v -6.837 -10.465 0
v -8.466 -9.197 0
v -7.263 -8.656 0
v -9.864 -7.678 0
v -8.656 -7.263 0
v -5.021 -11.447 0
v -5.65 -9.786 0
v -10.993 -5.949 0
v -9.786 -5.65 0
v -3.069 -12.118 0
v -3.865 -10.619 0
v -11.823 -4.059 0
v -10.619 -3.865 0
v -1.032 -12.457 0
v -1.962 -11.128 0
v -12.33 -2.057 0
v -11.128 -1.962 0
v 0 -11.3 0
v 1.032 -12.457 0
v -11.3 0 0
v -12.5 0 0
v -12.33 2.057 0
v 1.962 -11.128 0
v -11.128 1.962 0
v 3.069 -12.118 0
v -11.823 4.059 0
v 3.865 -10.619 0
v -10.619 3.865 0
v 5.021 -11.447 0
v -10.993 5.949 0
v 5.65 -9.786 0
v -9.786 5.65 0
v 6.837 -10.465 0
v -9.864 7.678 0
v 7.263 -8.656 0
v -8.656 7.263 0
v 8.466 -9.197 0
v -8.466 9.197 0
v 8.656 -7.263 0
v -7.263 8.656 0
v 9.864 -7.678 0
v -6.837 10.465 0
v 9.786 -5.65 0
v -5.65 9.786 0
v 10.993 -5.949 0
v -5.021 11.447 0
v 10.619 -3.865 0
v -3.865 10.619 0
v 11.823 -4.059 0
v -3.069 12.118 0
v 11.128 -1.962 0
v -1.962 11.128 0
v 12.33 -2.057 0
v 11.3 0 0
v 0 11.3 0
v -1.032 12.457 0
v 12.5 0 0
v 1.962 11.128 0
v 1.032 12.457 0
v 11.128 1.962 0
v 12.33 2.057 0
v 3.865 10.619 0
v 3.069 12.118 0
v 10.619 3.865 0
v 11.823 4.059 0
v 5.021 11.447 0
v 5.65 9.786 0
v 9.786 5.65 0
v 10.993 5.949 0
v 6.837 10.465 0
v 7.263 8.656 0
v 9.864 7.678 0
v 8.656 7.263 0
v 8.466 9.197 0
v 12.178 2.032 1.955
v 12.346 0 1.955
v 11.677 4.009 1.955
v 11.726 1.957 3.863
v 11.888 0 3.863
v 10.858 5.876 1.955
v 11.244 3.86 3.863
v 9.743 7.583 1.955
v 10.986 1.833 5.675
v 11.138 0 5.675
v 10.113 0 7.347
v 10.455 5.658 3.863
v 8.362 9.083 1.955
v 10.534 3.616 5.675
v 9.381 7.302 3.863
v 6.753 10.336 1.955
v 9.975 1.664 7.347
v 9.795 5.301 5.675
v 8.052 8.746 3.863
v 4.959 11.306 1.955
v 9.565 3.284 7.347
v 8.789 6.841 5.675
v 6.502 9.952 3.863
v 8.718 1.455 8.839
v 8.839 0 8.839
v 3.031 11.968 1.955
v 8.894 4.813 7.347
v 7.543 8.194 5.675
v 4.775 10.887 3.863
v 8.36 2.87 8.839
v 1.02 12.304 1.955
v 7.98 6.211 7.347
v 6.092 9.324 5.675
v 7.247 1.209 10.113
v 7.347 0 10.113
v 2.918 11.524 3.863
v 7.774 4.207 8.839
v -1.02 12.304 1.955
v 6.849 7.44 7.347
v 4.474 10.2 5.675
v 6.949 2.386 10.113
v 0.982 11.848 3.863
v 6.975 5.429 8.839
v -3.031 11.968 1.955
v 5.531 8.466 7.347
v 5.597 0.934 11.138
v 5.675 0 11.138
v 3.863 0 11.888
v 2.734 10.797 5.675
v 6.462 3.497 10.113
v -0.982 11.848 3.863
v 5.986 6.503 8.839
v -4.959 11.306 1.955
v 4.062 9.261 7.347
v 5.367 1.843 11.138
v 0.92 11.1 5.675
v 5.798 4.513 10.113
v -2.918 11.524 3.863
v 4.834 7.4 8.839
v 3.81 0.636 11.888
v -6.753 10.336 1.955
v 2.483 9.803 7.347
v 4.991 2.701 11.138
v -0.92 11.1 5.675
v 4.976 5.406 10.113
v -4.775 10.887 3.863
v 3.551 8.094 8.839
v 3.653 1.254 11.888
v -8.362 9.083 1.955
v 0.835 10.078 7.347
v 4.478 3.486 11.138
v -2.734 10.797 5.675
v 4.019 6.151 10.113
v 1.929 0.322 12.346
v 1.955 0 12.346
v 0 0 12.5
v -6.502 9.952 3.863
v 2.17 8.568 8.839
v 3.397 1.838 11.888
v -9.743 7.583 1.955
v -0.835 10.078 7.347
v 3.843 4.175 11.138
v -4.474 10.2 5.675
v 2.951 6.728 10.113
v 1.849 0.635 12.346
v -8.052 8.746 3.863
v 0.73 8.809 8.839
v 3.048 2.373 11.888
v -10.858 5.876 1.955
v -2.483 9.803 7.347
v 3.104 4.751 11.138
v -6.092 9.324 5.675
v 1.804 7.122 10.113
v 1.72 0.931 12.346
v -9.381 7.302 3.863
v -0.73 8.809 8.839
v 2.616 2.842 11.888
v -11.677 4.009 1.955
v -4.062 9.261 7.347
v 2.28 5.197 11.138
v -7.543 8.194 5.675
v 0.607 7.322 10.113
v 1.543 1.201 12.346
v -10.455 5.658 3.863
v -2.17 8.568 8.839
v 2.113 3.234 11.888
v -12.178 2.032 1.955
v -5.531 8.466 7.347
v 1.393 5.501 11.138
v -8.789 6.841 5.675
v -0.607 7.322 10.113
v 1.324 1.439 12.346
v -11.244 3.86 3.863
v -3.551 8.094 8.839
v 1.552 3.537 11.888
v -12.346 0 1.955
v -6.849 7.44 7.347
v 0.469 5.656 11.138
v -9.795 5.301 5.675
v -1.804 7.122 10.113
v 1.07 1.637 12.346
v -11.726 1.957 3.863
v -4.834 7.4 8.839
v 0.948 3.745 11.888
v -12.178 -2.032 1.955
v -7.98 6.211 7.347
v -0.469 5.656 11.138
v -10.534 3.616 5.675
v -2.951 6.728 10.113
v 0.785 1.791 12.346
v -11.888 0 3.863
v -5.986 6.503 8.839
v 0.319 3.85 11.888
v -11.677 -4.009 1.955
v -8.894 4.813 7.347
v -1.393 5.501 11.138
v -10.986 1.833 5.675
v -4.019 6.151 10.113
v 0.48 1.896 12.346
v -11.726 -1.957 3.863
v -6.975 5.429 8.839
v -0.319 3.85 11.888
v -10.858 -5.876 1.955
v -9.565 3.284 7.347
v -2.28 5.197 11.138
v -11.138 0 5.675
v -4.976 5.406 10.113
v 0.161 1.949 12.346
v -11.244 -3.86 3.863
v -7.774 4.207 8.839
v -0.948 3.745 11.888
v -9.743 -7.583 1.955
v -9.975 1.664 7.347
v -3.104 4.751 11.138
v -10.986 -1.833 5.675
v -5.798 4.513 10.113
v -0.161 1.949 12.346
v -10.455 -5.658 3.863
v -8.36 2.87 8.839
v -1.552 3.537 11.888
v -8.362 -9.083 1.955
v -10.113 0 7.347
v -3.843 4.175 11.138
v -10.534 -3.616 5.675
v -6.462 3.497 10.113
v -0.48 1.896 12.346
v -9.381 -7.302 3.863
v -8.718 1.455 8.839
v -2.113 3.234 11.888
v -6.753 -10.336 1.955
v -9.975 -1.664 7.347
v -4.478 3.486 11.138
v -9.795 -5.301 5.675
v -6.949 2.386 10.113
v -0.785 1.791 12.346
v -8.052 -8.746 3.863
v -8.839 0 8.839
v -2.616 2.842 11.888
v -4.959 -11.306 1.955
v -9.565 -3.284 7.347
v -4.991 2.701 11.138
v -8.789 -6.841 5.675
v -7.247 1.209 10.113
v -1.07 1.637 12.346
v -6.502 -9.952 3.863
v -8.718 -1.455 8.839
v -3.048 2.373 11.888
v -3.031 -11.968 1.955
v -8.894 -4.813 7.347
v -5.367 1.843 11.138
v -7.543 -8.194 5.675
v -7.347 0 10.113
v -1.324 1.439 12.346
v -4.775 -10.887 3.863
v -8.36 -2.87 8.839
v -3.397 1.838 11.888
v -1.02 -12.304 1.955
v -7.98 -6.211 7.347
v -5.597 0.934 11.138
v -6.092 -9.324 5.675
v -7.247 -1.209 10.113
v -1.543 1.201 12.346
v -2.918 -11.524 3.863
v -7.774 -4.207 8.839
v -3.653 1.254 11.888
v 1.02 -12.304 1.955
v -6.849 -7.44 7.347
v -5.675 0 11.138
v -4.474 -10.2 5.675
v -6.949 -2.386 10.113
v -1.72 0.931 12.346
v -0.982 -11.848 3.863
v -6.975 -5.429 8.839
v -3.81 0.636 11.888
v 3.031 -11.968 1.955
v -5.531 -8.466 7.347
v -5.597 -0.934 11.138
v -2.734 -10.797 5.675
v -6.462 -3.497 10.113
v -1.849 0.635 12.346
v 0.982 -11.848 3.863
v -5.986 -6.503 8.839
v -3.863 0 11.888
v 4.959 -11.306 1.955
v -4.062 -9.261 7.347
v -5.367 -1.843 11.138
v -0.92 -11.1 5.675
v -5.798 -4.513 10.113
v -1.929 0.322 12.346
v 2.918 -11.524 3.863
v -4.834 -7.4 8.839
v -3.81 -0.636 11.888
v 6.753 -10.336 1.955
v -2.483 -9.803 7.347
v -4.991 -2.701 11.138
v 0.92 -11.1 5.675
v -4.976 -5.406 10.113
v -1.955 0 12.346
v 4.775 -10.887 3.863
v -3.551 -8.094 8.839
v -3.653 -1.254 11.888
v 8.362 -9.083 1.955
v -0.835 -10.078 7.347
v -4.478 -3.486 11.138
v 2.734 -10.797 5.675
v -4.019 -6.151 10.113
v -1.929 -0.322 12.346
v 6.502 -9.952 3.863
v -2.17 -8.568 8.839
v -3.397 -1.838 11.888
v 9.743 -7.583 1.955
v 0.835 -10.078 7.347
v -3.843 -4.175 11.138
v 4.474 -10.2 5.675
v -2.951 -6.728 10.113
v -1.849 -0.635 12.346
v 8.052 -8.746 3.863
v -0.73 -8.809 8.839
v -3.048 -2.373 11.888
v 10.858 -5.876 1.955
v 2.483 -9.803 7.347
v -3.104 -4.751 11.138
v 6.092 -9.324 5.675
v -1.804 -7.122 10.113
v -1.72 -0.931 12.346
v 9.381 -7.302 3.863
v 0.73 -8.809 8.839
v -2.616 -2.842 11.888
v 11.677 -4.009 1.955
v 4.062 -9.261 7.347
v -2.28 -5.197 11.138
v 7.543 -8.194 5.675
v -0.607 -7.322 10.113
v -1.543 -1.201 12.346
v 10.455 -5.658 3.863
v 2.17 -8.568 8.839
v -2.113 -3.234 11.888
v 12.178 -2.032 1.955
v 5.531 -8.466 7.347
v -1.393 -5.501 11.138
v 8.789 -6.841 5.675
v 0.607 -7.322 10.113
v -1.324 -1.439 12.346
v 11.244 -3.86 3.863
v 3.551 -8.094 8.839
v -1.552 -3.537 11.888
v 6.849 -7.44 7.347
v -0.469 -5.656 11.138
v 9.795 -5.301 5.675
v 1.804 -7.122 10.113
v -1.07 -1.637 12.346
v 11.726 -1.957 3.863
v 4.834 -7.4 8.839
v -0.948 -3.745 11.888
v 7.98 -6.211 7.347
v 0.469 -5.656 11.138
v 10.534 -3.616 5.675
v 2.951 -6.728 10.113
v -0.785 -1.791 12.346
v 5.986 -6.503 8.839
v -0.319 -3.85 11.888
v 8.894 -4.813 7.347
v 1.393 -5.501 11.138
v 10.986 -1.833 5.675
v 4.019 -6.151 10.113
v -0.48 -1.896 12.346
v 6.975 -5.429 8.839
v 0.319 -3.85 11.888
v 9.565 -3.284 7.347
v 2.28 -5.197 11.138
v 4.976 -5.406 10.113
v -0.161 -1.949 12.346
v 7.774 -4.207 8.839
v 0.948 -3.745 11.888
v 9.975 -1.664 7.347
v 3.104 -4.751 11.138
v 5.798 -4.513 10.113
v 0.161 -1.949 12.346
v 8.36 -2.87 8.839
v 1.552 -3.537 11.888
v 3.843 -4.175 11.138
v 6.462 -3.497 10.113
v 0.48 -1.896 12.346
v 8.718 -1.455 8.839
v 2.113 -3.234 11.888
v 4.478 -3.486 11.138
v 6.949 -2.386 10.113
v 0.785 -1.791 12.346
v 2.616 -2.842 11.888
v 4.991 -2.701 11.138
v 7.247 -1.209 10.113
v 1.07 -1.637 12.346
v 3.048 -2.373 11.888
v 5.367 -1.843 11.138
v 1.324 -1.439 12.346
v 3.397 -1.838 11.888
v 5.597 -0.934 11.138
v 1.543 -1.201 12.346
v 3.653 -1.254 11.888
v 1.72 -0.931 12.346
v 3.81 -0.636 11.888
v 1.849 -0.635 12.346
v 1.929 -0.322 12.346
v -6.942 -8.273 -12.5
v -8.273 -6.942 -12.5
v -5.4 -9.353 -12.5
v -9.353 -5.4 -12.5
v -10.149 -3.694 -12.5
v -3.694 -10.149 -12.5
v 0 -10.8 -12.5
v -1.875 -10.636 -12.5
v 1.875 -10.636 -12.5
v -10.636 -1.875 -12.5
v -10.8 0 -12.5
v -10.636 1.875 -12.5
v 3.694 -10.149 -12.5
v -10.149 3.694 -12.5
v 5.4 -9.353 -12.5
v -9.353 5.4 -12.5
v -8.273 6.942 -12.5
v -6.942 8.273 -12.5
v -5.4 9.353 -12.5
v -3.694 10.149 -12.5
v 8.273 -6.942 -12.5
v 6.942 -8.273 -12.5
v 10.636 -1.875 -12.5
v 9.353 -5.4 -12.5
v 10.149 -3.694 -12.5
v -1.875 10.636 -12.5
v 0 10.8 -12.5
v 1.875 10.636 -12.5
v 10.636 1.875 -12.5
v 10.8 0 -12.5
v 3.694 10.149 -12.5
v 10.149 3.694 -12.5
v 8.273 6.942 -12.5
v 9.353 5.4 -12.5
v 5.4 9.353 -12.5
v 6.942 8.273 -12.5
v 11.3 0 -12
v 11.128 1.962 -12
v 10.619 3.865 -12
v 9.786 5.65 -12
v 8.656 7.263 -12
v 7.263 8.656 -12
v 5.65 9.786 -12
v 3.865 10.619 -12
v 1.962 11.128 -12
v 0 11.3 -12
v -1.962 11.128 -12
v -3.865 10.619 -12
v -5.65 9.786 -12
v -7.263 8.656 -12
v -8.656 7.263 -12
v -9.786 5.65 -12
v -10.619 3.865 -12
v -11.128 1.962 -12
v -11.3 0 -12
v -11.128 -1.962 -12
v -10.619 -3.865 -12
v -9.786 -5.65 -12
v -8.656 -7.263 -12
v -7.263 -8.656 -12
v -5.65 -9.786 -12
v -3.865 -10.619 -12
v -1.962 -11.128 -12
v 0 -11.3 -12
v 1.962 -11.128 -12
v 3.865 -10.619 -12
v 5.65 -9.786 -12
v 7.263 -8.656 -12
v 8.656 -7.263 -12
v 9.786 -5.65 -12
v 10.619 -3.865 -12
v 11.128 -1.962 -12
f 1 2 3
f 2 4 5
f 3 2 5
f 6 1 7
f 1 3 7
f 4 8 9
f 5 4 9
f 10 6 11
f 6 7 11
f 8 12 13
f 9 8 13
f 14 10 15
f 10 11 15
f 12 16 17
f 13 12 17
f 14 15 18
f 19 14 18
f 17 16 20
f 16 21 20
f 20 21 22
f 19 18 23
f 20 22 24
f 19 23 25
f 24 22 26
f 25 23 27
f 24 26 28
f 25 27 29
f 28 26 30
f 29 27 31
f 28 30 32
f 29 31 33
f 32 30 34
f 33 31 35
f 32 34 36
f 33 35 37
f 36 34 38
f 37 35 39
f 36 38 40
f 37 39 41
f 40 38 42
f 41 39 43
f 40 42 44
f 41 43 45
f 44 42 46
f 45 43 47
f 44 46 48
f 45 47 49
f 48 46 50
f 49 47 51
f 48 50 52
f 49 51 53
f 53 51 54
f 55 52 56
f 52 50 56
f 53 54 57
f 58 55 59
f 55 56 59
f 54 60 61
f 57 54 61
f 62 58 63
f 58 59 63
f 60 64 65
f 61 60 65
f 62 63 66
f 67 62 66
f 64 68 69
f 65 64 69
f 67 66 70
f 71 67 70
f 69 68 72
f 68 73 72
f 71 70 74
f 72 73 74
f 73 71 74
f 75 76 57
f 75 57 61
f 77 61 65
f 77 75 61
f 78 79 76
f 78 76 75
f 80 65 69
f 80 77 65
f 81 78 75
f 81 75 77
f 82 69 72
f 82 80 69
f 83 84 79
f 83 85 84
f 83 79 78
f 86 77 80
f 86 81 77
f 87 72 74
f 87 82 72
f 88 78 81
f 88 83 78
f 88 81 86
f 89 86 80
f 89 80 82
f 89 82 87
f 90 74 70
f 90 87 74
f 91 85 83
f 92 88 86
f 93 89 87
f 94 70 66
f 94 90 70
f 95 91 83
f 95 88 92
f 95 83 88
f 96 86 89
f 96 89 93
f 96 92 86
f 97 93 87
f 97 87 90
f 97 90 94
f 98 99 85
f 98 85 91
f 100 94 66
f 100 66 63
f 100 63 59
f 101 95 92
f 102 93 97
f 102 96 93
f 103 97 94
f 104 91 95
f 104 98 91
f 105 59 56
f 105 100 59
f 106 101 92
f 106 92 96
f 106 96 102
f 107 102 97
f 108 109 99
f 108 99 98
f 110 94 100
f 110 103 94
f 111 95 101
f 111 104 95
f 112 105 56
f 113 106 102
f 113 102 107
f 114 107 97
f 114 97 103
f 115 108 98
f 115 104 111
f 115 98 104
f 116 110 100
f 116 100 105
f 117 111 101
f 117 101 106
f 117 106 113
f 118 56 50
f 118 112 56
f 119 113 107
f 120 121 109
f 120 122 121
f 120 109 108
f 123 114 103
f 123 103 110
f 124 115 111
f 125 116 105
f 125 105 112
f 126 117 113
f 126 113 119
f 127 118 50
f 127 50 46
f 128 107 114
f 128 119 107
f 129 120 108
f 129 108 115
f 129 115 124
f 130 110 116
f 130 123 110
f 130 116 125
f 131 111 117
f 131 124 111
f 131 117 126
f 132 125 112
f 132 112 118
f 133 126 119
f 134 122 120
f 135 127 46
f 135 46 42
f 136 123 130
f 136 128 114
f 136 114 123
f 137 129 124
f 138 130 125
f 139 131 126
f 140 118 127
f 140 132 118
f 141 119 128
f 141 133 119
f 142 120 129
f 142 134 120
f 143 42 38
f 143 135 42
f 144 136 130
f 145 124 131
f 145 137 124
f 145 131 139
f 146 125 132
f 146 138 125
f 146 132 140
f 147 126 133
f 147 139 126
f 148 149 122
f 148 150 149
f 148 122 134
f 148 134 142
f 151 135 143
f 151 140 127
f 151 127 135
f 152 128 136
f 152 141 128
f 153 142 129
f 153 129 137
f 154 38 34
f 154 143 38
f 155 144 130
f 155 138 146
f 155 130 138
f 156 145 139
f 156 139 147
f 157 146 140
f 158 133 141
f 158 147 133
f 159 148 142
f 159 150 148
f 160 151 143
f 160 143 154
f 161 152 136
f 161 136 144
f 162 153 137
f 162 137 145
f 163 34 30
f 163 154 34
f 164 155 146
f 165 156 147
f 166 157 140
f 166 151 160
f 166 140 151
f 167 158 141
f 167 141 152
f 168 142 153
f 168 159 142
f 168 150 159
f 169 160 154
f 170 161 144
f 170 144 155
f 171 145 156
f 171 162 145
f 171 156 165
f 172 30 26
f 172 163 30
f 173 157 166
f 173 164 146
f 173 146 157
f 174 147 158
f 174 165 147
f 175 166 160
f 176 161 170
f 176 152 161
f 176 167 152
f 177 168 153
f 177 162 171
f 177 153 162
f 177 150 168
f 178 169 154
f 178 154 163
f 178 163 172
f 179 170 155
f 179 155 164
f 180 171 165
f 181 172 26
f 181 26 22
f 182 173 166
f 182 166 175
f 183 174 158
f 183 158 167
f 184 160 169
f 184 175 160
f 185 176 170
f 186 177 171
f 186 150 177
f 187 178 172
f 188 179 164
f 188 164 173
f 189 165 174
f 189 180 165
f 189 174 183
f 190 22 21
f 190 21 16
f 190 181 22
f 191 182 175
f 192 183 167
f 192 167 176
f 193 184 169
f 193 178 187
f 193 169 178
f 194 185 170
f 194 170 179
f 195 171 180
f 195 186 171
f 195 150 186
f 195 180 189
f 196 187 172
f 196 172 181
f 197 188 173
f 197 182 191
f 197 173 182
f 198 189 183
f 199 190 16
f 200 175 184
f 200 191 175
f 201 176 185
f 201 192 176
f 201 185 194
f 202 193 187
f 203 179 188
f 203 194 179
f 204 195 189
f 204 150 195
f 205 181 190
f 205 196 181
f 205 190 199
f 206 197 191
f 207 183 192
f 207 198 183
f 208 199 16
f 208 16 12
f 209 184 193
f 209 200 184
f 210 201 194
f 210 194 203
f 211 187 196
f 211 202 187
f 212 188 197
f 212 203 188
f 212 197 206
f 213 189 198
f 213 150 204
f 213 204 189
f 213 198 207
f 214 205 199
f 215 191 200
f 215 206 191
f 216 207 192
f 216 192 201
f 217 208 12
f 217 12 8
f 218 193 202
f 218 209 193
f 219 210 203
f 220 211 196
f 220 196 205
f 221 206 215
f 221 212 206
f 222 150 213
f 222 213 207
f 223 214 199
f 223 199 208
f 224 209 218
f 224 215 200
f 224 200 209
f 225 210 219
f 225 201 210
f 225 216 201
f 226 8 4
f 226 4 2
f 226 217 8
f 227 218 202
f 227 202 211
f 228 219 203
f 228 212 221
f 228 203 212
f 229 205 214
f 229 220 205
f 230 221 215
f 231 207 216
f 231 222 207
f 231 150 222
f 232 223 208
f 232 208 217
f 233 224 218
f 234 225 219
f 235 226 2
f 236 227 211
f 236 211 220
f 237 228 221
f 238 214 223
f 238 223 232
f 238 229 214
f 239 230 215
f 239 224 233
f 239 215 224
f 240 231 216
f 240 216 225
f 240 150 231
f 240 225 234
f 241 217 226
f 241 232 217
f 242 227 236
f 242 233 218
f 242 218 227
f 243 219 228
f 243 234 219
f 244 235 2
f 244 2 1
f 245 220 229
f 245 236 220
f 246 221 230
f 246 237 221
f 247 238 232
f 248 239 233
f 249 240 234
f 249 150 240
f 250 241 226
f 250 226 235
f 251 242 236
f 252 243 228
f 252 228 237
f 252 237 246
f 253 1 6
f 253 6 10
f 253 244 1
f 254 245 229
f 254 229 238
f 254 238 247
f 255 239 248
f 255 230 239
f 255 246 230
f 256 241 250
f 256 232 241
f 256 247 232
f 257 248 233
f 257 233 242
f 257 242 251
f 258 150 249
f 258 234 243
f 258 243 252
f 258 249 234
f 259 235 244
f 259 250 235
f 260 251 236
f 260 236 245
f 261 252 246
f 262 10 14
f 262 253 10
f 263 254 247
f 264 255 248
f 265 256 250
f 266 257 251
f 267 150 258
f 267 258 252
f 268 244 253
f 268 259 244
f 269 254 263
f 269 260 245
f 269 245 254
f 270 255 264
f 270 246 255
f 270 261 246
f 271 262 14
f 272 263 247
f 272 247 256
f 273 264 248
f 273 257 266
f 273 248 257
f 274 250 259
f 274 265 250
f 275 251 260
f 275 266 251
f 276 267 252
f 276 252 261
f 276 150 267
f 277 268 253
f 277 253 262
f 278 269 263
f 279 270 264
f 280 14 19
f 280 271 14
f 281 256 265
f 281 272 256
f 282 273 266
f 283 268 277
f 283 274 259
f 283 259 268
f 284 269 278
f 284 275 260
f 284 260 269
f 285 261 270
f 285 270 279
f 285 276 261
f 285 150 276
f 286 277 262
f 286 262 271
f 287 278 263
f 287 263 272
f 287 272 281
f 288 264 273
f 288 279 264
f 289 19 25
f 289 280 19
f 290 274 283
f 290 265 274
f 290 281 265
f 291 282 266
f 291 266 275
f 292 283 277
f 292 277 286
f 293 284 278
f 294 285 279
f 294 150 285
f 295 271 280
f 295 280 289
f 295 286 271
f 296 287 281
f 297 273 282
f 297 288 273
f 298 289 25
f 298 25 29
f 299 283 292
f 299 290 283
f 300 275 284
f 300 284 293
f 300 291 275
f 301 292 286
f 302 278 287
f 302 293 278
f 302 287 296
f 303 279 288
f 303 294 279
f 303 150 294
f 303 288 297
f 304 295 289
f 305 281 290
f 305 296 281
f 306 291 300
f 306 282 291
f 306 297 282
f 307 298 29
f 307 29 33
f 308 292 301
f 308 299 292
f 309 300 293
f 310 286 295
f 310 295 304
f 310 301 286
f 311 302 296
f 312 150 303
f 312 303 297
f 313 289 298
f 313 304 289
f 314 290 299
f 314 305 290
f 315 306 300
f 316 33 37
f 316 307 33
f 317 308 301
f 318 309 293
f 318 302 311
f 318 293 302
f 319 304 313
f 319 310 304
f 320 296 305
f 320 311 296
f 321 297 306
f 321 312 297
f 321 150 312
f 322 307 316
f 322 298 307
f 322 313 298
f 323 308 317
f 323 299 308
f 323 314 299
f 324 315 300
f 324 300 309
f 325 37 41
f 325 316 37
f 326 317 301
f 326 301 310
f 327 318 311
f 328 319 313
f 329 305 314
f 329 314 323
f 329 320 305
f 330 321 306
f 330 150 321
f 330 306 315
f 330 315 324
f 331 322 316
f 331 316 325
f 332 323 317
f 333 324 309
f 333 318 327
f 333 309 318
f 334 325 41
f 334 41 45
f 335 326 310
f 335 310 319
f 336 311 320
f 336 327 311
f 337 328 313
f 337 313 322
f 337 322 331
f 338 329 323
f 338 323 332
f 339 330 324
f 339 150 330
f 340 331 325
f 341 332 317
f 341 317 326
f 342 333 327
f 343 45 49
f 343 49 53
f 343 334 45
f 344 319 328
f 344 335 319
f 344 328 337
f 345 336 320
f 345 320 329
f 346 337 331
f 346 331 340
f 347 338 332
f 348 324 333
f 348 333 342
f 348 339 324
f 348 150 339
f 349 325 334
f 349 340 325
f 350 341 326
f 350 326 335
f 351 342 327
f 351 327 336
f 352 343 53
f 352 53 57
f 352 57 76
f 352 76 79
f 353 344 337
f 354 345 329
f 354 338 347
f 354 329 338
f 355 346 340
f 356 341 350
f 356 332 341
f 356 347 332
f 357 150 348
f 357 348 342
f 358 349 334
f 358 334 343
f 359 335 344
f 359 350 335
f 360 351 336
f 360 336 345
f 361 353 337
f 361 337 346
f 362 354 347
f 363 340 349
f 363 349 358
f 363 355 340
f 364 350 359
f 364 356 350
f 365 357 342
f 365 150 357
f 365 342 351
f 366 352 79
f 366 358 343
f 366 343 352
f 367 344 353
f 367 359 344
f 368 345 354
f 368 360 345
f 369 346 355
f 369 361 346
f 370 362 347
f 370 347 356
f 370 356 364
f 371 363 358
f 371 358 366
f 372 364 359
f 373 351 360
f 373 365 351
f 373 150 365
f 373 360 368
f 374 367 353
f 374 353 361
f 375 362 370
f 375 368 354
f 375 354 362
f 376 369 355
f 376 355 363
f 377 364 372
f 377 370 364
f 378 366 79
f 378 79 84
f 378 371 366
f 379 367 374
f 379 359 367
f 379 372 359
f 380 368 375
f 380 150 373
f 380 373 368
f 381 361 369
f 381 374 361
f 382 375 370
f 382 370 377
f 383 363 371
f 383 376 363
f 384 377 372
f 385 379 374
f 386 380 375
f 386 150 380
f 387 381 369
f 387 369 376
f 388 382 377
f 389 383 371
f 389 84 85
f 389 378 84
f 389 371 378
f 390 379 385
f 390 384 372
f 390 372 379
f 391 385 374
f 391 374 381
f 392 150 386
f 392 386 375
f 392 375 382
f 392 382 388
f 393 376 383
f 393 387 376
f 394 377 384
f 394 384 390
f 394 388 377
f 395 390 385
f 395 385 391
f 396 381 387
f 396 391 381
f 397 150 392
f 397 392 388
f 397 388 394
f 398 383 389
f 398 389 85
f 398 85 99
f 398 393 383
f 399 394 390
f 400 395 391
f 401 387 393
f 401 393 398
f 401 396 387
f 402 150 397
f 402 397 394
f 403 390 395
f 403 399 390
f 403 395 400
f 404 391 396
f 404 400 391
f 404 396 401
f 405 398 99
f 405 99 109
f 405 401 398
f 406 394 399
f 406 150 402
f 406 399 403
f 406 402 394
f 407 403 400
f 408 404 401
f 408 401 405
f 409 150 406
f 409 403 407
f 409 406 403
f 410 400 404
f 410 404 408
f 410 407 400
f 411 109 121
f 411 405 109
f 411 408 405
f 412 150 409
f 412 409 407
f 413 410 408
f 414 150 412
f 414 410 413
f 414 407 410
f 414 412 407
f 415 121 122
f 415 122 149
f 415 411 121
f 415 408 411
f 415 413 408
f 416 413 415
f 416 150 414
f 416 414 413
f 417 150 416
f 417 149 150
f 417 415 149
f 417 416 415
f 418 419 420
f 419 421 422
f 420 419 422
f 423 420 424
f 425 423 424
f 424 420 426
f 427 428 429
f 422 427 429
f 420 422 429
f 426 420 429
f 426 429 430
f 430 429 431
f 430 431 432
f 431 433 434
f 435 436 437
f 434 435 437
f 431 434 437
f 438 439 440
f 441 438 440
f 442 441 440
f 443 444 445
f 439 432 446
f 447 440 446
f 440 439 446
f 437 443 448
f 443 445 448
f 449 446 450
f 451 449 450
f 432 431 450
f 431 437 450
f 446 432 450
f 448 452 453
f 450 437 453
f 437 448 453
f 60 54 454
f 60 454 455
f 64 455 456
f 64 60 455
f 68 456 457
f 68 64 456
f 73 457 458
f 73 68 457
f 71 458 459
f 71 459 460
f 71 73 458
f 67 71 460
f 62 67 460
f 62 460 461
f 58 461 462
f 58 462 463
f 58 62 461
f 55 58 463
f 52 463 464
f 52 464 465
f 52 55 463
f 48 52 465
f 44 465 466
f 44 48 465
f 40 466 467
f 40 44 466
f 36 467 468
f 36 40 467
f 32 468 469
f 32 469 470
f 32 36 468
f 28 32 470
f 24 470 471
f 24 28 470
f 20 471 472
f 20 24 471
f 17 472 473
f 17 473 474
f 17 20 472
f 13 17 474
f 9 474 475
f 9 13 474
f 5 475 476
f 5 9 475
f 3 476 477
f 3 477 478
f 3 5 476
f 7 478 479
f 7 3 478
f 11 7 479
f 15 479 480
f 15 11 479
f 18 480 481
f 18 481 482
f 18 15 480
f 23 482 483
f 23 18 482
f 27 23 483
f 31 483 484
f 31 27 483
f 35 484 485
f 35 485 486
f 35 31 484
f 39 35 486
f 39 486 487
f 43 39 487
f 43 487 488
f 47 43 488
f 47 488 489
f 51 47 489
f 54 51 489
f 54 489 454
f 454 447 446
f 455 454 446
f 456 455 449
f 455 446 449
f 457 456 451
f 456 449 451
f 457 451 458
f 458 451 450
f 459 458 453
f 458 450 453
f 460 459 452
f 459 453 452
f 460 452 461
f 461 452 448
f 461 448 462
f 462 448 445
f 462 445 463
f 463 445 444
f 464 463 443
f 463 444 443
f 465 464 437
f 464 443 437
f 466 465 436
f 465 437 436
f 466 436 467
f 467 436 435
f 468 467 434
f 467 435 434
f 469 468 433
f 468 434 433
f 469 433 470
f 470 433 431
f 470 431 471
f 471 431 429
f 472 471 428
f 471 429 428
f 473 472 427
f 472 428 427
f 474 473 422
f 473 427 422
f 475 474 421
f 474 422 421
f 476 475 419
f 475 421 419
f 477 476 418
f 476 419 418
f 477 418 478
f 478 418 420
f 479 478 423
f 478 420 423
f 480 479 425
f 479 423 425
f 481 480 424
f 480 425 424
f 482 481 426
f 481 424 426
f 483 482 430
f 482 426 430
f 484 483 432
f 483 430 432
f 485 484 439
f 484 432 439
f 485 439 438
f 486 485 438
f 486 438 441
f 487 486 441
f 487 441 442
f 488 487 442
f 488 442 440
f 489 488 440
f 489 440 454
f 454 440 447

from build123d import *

# Parameters (mm, degrees)
F0_R     = 12.5
F1_DEPTH = 12.5
F2_R     = 12.49999
F3_R     = 11.3
F4_DEPTH = 12.5
F5_SIZE  = 0.5


# Not quite as in the source:
# - a fillet or chamfer is up to 0.001 mm smaller than in the source, because OpenCascade refuses the exact size


with BuildPart() as f1:
    # F0 (on Top) → F1 (new body)
    with BuildSketch(Plane.XY):
        Circle(F0_R)
    extrude(amount=F1_DEPTH)

    # F2 (radius 12.5 in the source; OpenCascade refuses exactly that, so slightly less here)
    f2_edges = [f1.edges().sort_by_distance(p)[0] for p in [
        (-12.5, 0, 12.5),
    ]]
    fillet(f2_edges, radius=F2_R)

    # F3 (on Top) → F4 (join)
    with BuildSketch(Plane.XY):
        Circle(F3_R)
    extrude(amount=-F4_DEPTH)

    # F5
    f5_edges = [f1.edges().sort_by_distance(p)[0] for p in [
        (-11.3, 0, -12.5),
    ]]
    chamfer(f5_edges, length=F5_SIZE)


solid = f1.part
